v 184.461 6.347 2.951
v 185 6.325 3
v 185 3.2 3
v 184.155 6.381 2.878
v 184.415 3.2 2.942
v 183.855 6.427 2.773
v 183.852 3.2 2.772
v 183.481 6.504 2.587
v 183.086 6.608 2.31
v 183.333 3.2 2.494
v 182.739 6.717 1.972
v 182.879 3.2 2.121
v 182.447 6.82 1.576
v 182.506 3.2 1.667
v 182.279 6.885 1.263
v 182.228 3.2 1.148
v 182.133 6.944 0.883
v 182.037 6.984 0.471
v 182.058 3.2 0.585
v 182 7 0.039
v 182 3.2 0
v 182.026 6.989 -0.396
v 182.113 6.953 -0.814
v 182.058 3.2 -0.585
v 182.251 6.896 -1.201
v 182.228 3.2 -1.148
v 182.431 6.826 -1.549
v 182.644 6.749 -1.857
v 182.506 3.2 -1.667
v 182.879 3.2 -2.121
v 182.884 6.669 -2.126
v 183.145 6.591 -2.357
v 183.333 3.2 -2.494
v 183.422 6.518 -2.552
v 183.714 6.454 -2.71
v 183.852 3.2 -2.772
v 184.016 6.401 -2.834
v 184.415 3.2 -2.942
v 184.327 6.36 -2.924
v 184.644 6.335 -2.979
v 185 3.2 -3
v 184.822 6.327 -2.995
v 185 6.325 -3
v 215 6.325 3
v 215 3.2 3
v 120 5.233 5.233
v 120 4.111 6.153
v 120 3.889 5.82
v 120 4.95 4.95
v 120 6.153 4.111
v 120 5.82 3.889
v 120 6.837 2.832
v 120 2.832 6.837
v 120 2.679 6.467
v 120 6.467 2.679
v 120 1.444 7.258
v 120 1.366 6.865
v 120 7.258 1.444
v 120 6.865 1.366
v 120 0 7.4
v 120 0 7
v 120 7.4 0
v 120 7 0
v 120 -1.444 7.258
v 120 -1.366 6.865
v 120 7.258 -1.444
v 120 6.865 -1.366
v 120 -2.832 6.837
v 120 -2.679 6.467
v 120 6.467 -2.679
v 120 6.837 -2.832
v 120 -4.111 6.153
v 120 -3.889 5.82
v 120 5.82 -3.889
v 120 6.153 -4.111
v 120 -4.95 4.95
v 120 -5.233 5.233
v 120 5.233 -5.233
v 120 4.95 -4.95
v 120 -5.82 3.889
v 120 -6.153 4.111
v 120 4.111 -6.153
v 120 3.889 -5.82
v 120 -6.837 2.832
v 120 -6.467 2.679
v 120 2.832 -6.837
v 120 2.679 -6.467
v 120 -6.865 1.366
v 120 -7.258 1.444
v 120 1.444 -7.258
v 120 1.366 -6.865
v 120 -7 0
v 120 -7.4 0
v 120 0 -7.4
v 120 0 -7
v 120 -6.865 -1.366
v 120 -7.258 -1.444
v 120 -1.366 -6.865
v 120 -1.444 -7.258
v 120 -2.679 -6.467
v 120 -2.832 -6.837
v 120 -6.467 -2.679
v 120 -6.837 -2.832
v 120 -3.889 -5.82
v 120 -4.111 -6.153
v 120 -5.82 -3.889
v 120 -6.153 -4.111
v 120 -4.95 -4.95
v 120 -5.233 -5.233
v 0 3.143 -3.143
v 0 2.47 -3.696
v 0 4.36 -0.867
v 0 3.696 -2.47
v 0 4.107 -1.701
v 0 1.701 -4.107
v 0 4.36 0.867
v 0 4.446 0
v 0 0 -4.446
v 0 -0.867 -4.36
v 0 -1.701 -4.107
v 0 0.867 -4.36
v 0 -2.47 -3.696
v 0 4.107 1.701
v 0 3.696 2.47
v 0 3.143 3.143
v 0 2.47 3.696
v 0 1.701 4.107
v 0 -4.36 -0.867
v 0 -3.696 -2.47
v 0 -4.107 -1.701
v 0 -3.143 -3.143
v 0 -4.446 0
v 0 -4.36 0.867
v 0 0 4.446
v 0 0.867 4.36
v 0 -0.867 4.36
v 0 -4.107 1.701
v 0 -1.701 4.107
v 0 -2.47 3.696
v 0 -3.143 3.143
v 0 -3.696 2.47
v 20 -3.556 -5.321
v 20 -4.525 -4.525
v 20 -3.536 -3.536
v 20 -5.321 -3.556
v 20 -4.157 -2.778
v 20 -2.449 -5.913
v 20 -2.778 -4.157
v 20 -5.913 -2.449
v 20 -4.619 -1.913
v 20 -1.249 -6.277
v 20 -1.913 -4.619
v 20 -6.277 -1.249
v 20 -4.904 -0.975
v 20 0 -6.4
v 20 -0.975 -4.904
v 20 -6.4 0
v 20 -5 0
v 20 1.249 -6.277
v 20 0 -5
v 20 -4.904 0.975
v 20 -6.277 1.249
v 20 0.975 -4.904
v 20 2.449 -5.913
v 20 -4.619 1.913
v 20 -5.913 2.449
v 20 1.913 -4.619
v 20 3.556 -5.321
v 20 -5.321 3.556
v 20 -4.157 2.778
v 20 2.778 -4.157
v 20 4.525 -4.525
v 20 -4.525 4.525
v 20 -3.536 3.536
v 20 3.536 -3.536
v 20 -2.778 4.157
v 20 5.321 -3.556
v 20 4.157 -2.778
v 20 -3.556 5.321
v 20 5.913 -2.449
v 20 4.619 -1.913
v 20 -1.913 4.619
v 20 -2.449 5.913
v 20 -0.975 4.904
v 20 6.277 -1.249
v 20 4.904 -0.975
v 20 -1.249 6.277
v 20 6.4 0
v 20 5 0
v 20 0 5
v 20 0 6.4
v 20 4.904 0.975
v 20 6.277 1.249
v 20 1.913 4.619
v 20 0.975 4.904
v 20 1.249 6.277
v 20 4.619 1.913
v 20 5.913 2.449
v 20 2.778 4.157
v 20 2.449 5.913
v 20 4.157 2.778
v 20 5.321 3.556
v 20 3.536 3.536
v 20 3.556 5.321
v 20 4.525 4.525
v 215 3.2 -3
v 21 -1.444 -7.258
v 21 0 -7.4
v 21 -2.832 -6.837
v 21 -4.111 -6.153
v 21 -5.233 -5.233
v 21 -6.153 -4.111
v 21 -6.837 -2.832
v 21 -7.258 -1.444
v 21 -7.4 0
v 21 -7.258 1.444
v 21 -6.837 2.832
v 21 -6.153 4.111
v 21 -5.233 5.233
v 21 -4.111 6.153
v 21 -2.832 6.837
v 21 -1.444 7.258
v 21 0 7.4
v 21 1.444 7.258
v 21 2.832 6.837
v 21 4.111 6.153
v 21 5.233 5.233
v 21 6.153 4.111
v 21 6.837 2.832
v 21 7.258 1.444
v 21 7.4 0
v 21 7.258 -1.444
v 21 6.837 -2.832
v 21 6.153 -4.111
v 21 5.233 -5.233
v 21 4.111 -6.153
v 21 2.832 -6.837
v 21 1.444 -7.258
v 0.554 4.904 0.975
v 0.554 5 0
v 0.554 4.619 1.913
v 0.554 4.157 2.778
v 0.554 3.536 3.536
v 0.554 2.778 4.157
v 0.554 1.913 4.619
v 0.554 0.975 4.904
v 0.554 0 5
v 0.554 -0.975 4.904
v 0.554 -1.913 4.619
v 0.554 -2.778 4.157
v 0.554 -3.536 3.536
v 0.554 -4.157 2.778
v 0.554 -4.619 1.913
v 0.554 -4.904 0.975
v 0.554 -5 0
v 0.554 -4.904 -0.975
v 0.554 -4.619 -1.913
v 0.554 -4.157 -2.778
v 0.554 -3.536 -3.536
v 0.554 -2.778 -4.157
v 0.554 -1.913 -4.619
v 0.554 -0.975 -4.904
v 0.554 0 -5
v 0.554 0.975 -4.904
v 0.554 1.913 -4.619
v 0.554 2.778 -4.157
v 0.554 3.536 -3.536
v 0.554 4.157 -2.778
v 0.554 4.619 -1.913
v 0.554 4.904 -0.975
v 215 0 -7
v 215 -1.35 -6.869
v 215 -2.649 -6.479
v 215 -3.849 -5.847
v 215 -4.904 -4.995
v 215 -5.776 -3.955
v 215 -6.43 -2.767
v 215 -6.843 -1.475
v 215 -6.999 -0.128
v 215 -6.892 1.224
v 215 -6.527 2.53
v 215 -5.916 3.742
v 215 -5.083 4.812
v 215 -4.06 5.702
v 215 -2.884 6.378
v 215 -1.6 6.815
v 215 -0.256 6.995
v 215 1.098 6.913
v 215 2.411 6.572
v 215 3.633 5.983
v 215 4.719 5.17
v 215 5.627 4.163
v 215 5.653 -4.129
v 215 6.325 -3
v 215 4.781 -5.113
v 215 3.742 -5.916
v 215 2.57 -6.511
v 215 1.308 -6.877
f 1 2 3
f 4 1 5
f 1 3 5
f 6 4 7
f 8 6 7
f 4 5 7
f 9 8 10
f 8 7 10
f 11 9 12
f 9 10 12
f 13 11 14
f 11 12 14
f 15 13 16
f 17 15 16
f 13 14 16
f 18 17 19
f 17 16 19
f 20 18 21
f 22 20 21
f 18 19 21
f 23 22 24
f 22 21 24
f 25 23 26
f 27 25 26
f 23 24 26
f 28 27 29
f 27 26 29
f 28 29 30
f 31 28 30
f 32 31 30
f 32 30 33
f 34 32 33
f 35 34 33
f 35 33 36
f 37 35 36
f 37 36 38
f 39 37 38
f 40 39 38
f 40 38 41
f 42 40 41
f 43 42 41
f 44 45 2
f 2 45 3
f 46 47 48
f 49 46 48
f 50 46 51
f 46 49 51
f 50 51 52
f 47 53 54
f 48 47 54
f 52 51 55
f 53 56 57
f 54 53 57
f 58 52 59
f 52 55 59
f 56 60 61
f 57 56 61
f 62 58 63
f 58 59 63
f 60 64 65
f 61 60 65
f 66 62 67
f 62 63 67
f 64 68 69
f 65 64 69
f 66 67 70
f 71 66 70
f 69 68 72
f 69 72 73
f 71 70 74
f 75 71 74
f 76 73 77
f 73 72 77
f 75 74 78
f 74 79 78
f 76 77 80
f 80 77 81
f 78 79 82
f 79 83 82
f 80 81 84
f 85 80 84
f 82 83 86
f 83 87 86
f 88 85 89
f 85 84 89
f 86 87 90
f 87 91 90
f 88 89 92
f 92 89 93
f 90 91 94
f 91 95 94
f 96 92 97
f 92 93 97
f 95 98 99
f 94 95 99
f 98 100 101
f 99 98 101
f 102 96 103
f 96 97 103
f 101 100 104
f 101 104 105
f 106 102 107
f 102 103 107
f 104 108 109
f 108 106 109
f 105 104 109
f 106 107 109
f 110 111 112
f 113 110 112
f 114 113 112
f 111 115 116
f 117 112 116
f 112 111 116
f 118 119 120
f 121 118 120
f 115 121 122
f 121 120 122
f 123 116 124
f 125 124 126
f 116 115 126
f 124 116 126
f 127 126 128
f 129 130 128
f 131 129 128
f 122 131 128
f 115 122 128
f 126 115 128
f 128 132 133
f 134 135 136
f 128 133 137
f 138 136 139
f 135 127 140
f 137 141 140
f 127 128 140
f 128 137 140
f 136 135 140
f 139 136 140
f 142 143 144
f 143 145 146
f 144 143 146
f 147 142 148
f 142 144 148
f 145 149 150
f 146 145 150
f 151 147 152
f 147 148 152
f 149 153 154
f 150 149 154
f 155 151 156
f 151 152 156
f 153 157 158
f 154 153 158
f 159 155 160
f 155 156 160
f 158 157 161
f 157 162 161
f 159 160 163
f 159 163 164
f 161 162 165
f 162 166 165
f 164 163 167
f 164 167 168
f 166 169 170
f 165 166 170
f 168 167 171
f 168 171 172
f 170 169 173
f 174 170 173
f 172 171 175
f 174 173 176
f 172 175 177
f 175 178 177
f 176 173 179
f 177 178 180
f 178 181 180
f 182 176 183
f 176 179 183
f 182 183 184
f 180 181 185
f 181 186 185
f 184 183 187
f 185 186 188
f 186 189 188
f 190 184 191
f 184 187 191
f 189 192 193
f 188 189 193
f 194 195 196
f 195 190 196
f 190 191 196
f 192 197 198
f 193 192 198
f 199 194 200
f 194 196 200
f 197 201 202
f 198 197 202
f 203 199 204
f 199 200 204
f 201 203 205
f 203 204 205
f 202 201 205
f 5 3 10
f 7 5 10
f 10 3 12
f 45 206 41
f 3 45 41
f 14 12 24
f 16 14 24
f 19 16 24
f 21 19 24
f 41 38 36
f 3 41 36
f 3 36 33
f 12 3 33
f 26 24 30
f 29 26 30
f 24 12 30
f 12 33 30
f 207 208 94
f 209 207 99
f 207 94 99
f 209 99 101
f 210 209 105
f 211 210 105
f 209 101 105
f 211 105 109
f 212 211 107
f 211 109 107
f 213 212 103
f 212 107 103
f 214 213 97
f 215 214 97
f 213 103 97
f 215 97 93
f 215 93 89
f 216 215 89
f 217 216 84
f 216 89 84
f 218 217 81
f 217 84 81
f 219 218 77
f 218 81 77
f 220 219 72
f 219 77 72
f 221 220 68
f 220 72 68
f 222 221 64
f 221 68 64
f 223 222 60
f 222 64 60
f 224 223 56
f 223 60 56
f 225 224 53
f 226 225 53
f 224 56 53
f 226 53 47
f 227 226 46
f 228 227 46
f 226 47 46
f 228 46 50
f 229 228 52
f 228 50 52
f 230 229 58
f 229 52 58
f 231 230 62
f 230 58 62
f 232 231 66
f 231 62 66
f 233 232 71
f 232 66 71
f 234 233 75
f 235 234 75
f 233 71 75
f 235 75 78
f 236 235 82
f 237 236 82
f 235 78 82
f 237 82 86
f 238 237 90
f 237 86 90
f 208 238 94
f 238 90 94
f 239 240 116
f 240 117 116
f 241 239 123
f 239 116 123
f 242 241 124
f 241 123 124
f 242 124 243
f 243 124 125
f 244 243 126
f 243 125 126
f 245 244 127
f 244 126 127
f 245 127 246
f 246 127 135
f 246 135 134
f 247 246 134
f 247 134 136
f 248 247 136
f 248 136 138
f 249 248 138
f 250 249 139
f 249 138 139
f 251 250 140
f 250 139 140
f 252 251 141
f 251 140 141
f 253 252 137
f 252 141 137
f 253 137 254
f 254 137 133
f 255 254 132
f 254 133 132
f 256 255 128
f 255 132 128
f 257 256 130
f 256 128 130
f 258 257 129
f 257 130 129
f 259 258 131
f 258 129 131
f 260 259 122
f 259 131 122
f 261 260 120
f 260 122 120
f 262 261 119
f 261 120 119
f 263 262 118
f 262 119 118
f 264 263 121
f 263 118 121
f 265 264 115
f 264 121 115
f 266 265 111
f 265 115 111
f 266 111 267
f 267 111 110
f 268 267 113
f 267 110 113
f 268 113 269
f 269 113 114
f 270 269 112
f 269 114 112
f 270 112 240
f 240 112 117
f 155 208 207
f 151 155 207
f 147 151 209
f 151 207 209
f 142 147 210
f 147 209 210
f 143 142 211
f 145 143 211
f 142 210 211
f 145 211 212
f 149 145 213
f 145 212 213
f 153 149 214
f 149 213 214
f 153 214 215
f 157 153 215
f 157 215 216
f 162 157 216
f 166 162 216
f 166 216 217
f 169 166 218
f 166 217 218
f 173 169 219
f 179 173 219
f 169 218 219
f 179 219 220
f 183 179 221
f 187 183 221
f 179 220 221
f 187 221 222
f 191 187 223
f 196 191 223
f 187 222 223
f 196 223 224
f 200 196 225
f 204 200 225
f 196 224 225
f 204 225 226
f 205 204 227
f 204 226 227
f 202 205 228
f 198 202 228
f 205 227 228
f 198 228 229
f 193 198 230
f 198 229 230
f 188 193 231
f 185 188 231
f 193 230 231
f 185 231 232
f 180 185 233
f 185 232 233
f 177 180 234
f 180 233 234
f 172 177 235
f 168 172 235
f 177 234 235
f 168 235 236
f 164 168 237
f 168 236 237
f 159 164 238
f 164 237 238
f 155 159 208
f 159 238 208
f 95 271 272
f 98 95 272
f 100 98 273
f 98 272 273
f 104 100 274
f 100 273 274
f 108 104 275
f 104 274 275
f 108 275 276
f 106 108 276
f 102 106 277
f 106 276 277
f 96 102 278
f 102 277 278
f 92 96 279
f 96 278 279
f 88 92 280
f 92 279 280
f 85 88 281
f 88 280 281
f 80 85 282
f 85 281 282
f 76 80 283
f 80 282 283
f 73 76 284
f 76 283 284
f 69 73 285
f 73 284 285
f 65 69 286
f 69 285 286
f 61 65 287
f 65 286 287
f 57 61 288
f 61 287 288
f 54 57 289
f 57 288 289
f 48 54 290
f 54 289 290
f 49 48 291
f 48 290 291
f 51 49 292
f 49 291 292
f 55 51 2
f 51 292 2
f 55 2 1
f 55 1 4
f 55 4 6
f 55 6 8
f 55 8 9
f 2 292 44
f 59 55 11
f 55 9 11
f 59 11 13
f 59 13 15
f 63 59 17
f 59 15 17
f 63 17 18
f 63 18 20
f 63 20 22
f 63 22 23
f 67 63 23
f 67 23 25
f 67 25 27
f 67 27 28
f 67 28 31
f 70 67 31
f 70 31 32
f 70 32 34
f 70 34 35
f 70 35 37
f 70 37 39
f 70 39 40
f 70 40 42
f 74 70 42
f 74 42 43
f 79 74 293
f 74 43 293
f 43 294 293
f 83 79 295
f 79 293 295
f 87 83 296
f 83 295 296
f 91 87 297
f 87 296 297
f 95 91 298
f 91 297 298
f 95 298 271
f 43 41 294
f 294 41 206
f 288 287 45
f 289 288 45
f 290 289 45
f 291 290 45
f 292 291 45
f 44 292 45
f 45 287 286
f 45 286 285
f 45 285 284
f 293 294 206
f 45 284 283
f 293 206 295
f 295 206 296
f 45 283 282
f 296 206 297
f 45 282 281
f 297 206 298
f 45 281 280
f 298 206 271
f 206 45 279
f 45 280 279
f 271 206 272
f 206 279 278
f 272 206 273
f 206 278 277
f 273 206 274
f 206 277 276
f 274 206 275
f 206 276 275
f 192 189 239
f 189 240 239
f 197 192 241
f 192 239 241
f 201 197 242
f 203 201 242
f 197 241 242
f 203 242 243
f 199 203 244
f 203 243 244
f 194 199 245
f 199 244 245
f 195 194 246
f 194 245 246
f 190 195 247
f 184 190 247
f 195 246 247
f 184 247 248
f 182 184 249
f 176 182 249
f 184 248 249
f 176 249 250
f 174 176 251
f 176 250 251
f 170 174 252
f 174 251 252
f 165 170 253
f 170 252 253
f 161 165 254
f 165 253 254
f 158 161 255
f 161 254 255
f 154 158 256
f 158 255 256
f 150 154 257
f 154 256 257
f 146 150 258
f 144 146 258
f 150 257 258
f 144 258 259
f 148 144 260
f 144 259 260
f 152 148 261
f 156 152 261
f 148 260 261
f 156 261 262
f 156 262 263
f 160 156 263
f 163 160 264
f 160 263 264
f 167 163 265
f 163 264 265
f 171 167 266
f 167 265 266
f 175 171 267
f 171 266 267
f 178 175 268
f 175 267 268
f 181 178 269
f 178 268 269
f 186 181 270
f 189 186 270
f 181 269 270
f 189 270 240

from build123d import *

# Parameters (mm, degrees)
CHAMFER1_SIZE      = 1
CUT_EXTRUDE1_START = 3.2
CUT_EXTRUDE1_DEPTH = 10


# Read off the part's stored shape, not the designer's step: M10x1.0 Machine Threads Stud1
with BuildPart() as part:
    # Sketch1 → Revolve1 (revolve)
    with BuildSketch(Plane(origin=(0, 0, 0), x_dir=(1, 0, 0), z_dir=(0, 1, 0))):
        Polygon((0, 0), (0, 7), (20, 7), (20, 7.4), (120, 7.4), (120, 7), (215, 7), (215, 0), align=None)
    revolve(axis=Axis((215, 0, 0), (-1, 0, 0)))

    # M10x1.0 Machine Threads Stud1 outline → M10x1.0 Machine Threads Stud1 (revolve, cut)
    with BuildSketch(Plane.YX):
        Polygon((7, 20), (5, 20), (5, 0.5545), (4.4455, 0), (7, 0), align=None)
    revolve(axis=Axis((0, 0, 0), (1, 0, 0)), mode=Mode.SUBTRACT)

    # Chamfer1
    chamfer1_edges = [part.edges().sort_by_distance(p)[0] for p in [
        (20, 0, 7.4),
    ]]
    chamfer(chamfer1_edges, length=CHAMFER1_SIZE)

    # Sketch3 → Cut-Extrude1 (cut)
    with BuildSketch(Plane(origin=(0, 0, 0), x_dir=(1, 0, 0), z_dir=(0, 1, 0)).offset(CUT_EXTRUDE1_START)):
        with BuildLine():
            Line((245, -3), (185, -3))
            ThreePointArc((185, -3), (182, 0), (185, 3))
            Line((185, 3), (245, 3))
            Line((245, 3), (245, -3))
        make_face()
    extrude(amount=CUT_EXTRUDE1_DEPTH, mode=Mode.SUBTRACT)


solid = part.part
